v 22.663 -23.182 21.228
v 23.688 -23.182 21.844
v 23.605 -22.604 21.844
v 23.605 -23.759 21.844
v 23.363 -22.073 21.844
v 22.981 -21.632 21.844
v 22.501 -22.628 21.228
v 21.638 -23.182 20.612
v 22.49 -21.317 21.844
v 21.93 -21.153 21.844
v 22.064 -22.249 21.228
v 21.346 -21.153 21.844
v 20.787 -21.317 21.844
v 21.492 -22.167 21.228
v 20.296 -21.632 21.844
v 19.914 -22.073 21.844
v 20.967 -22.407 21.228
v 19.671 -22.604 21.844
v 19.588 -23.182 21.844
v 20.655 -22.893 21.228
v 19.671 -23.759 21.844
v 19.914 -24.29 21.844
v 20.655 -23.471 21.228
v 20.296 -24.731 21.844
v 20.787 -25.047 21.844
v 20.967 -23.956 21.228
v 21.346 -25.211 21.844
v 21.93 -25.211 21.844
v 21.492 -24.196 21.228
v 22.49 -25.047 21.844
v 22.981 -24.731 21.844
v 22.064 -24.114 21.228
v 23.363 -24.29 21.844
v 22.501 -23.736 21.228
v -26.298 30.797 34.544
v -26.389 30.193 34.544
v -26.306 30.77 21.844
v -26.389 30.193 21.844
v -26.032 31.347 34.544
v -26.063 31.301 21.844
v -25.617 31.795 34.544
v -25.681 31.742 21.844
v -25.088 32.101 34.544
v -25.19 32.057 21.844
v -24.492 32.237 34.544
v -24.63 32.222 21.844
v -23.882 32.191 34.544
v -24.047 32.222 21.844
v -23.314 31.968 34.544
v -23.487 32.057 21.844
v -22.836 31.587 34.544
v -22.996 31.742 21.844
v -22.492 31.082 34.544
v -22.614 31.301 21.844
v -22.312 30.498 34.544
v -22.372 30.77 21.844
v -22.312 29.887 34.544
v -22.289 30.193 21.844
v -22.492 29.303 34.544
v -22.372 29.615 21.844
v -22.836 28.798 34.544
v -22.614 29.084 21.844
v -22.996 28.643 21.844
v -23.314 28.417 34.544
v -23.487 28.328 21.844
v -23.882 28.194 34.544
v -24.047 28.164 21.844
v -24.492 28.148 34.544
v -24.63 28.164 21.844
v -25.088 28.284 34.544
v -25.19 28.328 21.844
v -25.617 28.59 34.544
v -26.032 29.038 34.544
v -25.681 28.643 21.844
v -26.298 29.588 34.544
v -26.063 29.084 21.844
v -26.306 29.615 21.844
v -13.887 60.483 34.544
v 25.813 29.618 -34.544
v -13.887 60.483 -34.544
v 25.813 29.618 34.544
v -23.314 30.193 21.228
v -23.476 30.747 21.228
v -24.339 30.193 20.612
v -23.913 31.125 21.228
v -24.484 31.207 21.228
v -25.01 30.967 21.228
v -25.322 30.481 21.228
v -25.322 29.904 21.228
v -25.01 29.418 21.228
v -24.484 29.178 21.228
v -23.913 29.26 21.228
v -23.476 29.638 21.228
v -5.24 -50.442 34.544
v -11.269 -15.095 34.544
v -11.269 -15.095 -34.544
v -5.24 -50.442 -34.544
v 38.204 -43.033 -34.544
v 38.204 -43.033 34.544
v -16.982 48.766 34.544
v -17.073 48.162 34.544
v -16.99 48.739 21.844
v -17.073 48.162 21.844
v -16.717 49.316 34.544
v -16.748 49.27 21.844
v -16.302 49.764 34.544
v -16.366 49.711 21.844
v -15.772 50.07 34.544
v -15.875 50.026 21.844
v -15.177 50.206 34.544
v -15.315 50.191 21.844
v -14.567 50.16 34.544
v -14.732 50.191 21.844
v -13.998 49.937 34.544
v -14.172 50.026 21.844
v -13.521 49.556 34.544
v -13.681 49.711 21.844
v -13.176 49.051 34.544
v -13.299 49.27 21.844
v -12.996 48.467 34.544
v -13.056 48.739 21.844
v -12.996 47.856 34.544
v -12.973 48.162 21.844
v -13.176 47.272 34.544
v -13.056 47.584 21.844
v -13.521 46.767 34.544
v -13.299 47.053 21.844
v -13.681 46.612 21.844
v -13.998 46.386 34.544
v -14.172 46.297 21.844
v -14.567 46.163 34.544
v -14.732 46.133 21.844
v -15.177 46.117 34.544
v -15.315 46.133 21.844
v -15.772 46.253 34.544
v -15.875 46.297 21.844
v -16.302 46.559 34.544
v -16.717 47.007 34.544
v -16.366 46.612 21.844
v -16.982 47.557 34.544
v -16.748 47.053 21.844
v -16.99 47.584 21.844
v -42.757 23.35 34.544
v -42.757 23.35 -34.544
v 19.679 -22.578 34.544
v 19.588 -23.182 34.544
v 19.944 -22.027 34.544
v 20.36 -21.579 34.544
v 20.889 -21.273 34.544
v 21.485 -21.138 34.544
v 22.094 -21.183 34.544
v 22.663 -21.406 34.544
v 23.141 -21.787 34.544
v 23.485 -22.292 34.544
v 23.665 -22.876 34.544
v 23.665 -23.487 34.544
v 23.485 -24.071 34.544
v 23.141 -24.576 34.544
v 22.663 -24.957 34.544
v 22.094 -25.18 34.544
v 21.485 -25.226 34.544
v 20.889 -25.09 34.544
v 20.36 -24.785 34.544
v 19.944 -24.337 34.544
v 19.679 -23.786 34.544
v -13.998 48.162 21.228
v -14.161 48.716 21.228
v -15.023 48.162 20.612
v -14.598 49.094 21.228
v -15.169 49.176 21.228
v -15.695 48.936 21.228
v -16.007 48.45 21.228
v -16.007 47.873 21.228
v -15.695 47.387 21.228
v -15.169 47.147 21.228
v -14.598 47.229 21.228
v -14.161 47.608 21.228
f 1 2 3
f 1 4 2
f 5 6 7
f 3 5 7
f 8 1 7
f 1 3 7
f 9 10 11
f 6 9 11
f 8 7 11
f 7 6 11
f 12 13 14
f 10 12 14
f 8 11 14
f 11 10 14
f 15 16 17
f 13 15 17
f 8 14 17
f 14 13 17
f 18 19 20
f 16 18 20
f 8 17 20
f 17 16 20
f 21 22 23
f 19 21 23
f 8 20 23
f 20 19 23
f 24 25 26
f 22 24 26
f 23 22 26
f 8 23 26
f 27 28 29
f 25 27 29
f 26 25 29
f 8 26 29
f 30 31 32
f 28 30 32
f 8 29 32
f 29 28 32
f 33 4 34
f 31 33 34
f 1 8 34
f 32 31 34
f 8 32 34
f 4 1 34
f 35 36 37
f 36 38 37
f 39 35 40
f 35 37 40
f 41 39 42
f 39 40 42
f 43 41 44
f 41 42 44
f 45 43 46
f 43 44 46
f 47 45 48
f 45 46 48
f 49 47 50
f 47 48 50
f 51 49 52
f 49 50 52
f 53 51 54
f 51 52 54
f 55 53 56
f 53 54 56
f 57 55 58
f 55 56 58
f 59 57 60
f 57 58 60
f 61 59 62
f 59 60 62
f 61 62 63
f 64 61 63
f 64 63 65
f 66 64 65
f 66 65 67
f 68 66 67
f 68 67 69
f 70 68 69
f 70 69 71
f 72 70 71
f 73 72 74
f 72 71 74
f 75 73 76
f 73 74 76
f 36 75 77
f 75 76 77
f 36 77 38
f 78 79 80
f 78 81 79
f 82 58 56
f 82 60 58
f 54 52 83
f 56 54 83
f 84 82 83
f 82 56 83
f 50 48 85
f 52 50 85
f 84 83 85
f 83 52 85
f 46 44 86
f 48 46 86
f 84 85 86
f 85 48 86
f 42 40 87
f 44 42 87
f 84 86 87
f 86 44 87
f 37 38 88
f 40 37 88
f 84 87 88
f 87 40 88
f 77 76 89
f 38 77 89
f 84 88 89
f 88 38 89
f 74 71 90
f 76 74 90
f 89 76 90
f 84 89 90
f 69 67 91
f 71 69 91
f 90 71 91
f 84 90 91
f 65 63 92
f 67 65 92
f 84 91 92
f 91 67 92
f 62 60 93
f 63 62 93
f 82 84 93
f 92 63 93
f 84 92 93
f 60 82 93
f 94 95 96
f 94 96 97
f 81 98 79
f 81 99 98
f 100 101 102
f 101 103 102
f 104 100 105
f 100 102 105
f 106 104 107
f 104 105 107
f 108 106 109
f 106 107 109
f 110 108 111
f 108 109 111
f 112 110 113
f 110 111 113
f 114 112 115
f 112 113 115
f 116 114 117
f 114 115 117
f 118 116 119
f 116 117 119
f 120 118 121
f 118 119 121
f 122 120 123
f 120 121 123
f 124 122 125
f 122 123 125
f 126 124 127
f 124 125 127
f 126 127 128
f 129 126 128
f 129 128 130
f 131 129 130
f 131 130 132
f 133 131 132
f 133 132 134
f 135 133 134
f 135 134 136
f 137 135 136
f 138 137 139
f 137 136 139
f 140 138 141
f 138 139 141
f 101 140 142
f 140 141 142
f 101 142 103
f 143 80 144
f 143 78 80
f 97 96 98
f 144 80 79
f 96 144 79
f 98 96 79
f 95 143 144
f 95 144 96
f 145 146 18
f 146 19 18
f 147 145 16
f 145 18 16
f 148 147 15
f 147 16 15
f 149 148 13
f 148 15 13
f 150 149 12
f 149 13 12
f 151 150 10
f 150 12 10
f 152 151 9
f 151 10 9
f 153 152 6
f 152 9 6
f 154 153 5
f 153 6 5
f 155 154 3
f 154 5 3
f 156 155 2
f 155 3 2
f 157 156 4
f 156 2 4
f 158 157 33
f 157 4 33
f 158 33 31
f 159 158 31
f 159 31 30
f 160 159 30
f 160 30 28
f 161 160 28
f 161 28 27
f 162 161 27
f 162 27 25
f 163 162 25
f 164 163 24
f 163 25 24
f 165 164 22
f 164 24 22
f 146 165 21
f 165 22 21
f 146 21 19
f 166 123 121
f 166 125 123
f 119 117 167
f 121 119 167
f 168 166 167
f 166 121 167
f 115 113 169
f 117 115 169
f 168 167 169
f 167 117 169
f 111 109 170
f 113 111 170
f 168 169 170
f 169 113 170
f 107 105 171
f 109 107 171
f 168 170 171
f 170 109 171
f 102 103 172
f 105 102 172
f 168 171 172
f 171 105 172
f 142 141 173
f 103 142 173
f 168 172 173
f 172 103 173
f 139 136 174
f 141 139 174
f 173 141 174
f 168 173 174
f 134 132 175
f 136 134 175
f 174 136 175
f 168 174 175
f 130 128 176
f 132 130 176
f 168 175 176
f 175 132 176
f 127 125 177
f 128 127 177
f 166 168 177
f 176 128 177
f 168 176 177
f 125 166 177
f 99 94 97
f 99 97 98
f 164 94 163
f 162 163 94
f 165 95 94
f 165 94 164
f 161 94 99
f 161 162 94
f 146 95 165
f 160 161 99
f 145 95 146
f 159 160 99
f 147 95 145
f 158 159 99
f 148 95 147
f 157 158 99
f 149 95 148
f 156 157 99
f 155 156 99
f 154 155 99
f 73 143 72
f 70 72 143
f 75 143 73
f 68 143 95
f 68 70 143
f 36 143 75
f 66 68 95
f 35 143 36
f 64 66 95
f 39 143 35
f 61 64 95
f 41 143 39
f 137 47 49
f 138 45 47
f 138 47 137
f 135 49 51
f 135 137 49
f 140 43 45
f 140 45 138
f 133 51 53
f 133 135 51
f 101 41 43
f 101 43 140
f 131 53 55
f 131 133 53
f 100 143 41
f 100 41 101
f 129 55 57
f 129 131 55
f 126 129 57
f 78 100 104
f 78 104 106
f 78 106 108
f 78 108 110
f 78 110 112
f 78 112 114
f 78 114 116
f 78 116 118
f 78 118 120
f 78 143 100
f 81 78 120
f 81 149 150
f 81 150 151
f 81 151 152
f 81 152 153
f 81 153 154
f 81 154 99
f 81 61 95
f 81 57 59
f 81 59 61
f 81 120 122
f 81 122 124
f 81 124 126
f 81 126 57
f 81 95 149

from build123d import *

# Parameters (mm, degrees)
F1_DEPTH = 34.544
F3_D     = 4.1
F3_DEPTH = 12.7
F3_TIP   = 1.231764269


with BuildPart() as f1:
    # F0 (on Top) → F1 (new body, symmetric)
    with BuildSketch(Plane.XY):
        Polygon((-13.8865606859, 60.4830309749), (-42.757101357, 23.3497414738), (-11.2690485742, -15.0952798912), (-5.2401868215, -50.4424741696), (38.2038913667, -43.0325977504), (25.8125865485, 29.6175768167), align=None)
    extrude(amount=F1_DEPTH, both=True)

    # F3
    with Locations(Plane.XY.offset(34.544)):
        with Locations((-15.0234112516, 48.1616705656), (-24.3386197835, 30.192643404), (21.6382276267, -23.181784898)):
            Hole(F3_D / 2, depth=F3_DEPTH)
            with Locations((0, 0, -(F3_DEPTH + F3_TIP / 2))):  # 118° drill point
                Cone(0, F3_D / 2, F3_TIP, mode=Mode.SUBTRACT)


solid = f1.part
